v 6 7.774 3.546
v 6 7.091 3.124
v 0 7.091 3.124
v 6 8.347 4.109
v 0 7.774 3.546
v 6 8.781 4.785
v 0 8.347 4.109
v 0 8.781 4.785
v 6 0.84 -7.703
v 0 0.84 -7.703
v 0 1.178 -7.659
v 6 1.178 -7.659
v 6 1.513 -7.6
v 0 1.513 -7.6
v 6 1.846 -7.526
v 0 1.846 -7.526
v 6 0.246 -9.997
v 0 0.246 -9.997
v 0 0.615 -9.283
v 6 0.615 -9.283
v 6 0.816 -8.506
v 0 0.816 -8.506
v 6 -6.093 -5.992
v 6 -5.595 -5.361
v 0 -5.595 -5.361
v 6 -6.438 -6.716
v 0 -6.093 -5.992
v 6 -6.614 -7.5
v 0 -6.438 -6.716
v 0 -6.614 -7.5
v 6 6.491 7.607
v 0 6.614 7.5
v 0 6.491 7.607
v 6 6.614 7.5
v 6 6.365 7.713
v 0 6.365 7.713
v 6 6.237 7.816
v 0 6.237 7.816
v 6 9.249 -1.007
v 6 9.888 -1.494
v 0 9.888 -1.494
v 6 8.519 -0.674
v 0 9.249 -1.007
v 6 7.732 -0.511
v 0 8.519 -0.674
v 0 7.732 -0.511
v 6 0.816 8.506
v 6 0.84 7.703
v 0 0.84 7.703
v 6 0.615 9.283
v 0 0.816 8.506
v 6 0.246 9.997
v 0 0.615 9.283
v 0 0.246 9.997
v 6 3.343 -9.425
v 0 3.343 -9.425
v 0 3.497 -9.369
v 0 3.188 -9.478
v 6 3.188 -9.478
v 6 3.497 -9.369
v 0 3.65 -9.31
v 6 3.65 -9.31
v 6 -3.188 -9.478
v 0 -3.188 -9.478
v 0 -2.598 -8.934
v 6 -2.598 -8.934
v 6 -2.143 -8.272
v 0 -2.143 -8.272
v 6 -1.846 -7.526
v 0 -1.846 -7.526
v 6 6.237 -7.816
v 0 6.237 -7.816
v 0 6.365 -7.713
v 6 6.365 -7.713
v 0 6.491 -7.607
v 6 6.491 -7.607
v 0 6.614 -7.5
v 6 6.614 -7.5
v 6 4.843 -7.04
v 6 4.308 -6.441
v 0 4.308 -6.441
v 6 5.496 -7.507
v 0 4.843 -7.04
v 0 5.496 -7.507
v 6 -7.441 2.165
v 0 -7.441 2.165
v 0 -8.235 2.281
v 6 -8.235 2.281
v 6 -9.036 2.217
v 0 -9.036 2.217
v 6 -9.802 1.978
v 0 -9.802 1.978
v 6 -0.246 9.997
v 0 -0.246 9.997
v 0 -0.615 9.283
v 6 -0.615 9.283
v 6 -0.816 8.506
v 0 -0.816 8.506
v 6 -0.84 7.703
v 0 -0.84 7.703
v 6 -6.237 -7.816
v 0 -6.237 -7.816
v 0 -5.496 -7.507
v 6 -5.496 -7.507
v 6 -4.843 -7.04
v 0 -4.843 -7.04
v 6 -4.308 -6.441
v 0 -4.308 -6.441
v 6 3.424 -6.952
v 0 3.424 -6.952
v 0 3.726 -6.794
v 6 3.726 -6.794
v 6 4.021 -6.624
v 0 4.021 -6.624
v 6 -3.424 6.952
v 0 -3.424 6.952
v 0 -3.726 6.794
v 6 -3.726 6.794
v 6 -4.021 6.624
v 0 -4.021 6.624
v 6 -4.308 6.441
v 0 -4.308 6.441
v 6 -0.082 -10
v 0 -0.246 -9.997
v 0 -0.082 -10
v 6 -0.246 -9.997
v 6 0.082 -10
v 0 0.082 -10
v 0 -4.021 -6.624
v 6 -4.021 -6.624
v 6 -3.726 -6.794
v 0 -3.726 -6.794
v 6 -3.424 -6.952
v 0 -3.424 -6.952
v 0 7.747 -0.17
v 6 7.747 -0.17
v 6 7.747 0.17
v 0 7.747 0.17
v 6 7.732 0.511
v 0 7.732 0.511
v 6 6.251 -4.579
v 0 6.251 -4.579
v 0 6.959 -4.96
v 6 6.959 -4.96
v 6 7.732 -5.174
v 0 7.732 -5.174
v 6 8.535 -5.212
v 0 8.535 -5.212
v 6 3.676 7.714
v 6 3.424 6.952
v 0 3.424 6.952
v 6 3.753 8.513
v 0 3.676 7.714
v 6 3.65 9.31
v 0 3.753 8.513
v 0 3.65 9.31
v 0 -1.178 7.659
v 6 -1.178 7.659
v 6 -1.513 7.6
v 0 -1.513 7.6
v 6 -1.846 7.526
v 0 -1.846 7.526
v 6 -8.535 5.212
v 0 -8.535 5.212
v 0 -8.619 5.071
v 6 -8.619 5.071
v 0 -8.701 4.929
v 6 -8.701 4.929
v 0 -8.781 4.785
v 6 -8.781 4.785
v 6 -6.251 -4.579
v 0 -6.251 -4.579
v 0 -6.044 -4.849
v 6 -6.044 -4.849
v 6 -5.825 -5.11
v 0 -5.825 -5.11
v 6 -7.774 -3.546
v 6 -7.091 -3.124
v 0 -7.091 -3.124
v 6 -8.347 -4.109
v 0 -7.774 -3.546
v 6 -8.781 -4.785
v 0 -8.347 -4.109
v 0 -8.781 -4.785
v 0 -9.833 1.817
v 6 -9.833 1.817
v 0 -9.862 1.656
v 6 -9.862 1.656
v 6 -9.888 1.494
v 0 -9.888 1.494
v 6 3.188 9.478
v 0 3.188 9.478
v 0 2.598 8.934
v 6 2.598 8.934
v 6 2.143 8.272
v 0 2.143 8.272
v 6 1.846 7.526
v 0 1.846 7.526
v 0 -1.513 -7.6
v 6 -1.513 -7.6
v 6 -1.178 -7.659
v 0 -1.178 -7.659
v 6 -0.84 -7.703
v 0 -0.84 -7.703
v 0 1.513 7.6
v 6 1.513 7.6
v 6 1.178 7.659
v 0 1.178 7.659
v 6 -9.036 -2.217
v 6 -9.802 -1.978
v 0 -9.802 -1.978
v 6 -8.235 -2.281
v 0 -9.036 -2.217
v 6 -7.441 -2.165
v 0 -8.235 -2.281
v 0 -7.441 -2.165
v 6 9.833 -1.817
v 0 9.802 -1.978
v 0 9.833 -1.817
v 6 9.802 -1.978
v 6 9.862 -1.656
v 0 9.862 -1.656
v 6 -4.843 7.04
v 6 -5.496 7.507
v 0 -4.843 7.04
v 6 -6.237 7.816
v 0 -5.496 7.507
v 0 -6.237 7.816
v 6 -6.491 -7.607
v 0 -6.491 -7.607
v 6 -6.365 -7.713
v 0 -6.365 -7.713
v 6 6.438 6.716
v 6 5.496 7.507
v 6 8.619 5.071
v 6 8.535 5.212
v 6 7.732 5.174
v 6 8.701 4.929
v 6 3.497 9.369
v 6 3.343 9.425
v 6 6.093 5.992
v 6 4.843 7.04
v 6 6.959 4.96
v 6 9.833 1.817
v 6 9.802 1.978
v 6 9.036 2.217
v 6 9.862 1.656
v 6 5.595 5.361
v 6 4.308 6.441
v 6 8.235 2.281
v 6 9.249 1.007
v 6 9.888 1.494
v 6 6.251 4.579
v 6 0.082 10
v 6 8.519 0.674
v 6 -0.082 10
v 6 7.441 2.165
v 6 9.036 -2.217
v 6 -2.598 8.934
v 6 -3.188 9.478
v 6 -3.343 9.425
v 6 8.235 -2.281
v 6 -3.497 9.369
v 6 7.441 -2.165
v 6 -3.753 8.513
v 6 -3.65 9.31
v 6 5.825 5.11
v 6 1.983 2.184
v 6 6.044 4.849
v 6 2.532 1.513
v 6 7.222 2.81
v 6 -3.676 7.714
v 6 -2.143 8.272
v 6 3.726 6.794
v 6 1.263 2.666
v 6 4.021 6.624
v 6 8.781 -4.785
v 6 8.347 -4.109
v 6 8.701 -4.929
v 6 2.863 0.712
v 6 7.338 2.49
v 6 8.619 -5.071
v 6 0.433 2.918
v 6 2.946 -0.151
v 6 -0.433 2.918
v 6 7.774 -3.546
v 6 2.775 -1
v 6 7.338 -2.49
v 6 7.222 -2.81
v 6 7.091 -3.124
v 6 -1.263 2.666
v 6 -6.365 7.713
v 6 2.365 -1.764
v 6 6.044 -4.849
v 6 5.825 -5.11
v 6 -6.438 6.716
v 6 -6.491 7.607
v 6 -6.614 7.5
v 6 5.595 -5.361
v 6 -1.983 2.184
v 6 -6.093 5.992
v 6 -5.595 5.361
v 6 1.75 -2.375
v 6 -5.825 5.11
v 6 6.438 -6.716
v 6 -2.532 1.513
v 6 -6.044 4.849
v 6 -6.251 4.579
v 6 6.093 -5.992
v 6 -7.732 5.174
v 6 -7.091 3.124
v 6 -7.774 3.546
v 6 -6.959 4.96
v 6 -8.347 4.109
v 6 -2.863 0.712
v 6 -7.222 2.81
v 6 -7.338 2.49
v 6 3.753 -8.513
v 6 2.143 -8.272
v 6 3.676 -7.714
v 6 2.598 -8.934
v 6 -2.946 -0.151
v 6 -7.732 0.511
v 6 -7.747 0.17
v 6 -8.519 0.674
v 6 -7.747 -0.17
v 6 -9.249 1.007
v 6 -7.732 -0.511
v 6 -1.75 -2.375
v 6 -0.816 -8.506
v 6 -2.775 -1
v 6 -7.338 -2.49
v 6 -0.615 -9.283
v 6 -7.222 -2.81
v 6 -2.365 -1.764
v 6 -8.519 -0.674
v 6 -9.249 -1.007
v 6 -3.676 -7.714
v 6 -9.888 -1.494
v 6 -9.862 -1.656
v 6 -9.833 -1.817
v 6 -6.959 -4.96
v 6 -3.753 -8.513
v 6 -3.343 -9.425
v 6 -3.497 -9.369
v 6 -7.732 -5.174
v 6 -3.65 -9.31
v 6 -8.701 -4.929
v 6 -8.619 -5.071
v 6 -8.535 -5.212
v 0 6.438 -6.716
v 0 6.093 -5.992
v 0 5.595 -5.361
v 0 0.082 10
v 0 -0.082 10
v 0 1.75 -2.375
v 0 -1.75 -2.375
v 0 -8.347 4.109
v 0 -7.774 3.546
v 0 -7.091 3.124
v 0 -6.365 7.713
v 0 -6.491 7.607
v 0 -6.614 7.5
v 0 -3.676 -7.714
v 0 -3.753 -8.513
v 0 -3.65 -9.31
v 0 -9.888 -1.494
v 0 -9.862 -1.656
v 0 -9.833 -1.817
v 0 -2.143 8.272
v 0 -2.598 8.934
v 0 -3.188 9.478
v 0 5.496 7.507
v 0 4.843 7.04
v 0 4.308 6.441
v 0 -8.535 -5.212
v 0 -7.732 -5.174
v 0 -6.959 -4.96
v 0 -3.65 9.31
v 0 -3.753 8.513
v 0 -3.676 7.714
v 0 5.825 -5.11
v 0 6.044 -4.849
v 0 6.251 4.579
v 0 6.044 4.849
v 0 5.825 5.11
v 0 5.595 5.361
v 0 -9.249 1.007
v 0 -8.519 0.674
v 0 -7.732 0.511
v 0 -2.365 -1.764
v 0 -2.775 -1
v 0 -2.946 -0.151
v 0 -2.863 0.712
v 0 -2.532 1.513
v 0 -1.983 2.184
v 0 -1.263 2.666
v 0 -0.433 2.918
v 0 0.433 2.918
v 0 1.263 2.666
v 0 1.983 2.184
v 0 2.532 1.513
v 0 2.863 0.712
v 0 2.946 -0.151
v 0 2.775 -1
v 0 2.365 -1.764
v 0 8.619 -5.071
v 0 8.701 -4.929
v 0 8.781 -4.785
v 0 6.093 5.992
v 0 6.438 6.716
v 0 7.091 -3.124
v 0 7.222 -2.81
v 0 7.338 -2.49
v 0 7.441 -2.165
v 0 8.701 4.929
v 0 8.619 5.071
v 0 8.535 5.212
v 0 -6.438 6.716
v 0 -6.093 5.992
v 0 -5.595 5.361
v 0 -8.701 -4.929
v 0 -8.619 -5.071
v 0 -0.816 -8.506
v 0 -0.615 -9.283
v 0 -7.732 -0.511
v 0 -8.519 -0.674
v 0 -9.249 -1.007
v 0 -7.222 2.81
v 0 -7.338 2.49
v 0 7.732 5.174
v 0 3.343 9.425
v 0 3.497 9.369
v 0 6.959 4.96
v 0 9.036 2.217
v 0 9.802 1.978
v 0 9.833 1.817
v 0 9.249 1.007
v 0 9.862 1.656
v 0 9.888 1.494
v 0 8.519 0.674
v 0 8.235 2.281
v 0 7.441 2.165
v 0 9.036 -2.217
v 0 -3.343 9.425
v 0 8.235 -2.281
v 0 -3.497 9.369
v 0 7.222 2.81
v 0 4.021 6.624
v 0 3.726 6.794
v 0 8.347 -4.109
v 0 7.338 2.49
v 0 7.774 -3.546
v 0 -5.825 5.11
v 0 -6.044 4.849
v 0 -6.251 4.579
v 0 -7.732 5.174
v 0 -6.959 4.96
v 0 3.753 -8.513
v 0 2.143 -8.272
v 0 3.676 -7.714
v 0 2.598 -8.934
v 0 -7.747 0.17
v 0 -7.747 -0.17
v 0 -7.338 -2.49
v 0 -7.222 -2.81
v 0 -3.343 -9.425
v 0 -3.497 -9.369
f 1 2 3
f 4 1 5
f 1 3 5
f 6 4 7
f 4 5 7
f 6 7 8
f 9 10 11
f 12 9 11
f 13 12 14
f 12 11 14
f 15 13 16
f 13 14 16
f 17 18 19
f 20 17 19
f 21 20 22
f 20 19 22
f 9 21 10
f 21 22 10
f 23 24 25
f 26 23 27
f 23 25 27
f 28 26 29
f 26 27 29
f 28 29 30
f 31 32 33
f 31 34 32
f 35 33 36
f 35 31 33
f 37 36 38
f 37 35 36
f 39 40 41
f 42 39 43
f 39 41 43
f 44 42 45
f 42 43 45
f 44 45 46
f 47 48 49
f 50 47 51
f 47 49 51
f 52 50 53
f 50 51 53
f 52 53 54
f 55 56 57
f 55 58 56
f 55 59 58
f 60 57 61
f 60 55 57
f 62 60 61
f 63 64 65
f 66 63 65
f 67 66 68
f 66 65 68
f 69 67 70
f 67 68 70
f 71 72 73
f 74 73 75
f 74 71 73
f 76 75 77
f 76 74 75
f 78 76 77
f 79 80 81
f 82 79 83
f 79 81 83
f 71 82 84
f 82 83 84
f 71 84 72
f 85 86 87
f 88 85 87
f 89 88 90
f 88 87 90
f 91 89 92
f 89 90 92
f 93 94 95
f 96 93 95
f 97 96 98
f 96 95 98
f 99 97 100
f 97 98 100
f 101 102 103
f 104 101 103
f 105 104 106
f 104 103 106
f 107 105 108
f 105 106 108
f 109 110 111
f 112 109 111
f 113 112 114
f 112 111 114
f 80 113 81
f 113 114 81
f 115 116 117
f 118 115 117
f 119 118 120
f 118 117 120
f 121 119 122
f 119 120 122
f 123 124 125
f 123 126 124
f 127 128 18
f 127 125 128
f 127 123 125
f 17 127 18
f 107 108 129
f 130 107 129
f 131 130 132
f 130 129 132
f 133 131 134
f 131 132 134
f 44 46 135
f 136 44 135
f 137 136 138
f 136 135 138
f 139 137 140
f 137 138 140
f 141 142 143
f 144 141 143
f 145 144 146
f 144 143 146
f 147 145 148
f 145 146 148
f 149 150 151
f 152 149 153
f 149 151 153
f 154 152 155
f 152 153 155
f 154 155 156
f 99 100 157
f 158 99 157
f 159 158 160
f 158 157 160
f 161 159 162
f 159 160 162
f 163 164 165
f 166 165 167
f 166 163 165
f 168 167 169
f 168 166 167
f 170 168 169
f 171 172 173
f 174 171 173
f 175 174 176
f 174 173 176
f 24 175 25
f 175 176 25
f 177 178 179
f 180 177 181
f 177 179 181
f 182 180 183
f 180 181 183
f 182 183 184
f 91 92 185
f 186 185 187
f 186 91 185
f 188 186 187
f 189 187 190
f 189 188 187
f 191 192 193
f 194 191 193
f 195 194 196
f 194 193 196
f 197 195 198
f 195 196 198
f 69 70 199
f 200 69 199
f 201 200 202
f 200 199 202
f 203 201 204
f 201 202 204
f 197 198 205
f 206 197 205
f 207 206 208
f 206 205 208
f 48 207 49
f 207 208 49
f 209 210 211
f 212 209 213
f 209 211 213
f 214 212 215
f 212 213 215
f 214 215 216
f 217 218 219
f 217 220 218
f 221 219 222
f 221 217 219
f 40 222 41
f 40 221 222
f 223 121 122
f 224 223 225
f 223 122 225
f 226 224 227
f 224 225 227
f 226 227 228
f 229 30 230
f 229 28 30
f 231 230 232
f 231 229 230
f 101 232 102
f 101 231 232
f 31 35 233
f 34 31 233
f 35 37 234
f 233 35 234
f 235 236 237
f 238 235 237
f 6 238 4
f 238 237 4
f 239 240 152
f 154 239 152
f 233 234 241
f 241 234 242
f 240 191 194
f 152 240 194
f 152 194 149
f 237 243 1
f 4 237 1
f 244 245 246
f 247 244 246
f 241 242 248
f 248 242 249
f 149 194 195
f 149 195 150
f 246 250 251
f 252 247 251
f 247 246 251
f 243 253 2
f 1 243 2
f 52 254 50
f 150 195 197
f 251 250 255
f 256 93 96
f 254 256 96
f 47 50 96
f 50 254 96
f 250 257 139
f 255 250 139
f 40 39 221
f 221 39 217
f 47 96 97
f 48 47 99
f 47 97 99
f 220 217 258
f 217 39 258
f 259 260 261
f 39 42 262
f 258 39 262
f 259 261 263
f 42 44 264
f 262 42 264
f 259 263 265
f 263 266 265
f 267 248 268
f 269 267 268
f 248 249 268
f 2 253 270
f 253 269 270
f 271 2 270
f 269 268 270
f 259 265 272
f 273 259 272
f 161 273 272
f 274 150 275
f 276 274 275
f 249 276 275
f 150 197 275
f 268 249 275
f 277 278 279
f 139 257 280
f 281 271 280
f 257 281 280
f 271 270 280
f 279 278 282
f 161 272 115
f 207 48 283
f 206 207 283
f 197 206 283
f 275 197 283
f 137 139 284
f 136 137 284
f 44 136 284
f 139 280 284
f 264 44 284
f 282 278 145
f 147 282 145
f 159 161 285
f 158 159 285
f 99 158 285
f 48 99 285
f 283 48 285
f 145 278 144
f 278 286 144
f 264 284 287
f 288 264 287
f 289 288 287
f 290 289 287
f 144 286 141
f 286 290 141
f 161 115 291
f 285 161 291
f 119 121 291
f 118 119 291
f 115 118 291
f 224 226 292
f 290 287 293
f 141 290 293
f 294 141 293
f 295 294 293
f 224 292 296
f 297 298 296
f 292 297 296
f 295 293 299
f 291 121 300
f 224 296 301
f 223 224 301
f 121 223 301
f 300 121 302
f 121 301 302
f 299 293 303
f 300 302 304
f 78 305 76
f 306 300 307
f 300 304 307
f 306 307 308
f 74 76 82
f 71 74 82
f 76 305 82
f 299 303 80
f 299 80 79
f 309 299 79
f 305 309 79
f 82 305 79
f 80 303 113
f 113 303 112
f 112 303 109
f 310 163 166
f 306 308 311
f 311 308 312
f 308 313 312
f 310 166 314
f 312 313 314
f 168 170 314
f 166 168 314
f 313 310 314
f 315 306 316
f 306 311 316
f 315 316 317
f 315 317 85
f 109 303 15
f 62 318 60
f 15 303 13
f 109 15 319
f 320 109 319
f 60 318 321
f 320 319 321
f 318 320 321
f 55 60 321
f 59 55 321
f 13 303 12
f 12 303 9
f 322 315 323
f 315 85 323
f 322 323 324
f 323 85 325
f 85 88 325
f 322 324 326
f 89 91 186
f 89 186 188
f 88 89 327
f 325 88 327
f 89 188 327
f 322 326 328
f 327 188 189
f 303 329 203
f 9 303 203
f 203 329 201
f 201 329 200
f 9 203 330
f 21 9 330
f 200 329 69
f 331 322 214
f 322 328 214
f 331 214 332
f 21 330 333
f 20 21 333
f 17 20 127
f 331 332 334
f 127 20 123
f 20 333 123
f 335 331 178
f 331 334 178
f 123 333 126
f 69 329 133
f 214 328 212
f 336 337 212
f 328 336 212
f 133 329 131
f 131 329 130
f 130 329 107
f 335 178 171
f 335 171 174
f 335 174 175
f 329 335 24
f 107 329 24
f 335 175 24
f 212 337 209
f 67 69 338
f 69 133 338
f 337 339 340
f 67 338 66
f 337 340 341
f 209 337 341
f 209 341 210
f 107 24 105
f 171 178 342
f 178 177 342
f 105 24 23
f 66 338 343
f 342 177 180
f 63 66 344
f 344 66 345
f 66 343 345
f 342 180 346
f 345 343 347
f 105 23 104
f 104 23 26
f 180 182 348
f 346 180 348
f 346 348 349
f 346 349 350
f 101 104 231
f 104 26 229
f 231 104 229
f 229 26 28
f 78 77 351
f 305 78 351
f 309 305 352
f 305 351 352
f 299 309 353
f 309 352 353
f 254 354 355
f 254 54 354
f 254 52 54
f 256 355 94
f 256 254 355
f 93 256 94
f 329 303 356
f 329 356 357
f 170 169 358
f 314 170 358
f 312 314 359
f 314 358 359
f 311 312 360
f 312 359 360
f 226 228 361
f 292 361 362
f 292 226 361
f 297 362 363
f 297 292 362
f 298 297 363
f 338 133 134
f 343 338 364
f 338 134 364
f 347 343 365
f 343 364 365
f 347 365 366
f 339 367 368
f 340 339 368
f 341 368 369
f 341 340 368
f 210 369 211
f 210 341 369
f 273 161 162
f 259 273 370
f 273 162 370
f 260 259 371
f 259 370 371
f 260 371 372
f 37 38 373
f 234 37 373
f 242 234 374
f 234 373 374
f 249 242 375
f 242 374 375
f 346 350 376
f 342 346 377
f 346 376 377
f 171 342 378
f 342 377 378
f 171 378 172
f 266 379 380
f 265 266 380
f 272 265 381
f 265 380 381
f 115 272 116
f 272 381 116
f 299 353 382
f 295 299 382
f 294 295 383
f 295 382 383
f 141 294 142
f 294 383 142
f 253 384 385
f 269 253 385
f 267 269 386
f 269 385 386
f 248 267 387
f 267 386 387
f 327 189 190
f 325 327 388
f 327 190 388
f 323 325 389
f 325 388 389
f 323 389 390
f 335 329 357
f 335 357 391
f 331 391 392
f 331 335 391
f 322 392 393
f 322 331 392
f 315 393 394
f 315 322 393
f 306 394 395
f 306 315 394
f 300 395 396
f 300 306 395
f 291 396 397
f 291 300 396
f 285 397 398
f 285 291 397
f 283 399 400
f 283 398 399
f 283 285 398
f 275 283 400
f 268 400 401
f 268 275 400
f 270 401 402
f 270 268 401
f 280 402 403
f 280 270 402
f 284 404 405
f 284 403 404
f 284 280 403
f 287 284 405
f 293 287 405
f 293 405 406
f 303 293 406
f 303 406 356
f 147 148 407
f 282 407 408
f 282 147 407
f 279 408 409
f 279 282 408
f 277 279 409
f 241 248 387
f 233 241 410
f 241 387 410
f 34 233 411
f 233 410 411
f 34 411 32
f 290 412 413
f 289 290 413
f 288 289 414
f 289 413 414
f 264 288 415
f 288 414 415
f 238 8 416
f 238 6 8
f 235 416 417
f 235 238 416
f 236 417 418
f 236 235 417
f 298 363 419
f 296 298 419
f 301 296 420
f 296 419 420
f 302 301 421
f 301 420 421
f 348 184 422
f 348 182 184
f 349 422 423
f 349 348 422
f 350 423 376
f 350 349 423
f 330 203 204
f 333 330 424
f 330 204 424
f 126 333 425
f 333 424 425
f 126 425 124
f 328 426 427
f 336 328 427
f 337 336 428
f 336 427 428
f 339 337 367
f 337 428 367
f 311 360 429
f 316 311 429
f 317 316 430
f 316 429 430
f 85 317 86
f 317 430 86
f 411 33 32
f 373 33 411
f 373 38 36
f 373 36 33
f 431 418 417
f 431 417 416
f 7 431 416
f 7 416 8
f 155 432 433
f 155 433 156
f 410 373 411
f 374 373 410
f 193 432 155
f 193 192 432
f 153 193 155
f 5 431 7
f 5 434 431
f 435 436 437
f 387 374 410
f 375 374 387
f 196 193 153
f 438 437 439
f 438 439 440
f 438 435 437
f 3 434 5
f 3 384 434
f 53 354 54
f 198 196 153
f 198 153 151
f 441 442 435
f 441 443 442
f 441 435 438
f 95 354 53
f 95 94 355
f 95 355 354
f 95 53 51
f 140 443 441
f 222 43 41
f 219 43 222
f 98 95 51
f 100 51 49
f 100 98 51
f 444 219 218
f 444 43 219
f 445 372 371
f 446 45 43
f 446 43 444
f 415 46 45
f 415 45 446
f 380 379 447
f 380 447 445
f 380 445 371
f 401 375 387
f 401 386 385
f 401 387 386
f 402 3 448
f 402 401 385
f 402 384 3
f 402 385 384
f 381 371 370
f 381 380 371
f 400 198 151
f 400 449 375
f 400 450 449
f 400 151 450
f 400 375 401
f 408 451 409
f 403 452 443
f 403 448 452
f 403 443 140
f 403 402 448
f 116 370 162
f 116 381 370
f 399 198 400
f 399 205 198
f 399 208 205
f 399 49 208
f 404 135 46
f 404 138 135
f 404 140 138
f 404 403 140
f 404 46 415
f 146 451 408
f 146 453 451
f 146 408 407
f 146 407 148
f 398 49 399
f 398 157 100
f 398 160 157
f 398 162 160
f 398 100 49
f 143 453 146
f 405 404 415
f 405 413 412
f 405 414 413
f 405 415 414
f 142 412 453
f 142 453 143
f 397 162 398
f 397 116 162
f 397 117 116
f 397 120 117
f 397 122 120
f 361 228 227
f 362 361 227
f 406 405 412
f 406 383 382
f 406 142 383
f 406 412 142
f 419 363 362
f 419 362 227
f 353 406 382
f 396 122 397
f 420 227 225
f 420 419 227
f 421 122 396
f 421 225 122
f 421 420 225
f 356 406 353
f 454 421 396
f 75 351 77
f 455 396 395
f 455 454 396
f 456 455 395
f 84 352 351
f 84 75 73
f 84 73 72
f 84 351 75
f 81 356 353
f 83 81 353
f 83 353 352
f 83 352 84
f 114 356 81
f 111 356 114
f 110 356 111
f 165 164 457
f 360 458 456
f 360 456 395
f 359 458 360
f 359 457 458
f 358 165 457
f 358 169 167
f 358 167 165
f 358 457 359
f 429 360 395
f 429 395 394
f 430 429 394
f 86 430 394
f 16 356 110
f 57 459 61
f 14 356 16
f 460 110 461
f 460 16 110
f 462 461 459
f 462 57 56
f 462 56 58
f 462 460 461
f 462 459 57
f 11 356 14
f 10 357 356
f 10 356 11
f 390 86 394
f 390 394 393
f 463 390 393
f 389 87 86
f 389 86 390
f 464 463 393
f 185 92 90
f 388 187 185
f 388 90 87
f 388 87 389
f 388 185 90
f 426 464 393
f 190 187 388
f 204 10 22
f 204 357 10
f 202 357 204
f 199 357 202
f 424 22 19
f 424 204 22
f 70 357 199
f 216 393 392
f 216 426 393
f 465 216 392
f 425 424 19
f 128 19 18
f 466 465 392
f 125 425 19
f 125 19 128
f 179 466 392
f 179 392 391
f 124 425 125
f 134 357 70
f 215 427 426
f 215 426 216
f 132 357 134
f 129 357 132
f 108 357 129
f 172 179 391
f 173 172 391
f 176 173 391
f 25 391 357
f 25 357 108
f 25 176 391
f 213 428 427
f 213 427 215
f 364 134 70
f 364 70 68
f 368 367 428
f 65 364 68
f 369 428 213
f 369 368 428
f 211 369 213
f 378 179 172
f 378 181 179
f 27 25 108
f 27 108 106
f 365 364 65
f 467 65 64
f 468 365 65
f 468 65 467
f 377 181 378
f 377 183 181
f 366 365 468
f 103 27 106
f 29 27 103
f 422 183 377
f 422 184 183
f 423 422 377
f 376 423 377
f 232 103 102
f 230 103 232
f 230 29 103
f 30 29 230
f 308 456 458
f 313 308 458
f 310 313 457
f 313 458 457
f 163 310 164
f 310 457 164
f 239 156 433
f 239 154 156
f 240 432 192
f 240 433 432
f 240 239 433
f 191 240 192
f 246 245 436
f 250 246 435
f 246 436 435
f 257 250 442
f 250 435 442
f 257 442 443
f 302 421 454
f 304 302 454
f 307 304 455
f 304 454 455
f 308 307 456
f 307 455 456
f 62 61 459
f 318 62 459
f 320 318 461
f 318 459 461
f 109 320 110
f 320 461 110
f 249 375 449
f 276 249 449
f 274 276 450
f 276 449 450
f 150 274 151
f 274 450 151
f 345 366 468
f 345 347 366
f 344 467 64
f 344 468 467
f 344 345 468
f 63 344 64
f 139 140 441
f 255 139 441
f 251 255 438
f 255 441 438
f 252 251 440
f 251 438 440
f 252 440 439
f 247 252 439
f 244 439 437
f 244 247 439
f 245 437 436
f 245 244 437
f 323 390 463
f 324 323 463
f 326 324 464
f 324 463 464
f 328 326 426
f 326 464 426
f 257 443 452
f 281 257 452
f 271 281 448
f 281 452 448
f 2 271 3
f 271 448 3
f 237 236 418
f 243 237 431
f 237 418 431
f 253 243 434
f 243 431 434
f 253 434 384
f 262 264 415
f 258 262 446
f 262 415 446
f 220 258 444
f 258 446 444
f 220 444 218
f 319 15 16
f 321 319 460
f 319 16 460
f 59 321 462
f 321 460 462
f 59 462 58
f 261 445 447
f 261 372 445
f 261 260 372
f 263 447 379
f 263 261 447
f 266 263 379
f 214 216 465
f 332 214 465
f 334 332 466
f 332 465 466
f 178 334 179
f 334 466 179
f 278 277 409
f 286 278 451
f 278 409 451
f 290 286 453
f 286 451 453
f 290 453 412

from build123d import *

# Parameters (mm, degrees)
BASPROSKE_W        = 6
BASPROSKE_H        = 10
TOOTHCUT_DEPTH     = 16.362291496
TEETHCUTS_COUNT    = 18
TEETHCUTS_ANGLE    = 340
CUT_EXTRUDE1_DEPTH = 16.289512146


with BuildPart() as part:
    # BasProSke → Base-Revolve (revolve)
    with BuildSketch(Plane(origin=(0, 0, 0), x_dir=(1, 0, 0), z_dir=(0, 1, 0)), mode=Mode.PRIVATE) as base_revolve_sk:
        with Locations((3, 5)):
            Rectangle(BASPROSKE_W, BASPROSKE_H)
    revolve(base_revolve_sk.sketch.rotate(Axis((-10, 0, 0), (1, 0, 0)), 180), axis=Axis((-10, 0, 0), (1, 0, 0)))

    # TooCutSke → ToothCut (cut, through all)
    with BuildSketch(Plane(origin=(0, 0, 0), x_dir=(0, 0, -1), z_dir=(1, 0, 0))):
        with BuildLine():
            ThreePointArc((0.510641536, 7.732156635), (0, 7.749), (-0.510641536, 7.732156635))
            ThreePointArc((-0.510641536, 7.732156635), (-0.82619259, 8.907320741), (-1.515208602, 9.910236529))
            ThreePointArc((-1.515208602, 9.910236529), (0, 10.0254), (1.515208602, 9.910236529))
            ThreePointArc((1.515208602, 9.910236529), (0.82619259, 8.907320741), (0.510641536, 7.732156635))
        make_face()
    toothcut = extrude(amount=TOOTHCUT_DEPTH, mode=Mode.SUBTRACT)

    # TeethCuts: ToothCut ×18 about axis
    teethcuts_axis = Axis((-10, 0, 0), (1, 0, 0))
    for i in range(1, TEETHCUTS_COUNT):
        add(toothcut.rotate(teethcuts_axis, i * TEETHCUTS_ANGLE / (TEETHCUTS_COUNT - 1)), mode=Mode.SUBTRACT)

    # Sketch1 → Cut-Extrude1 (cut, through all)
    with BuildSketch(Plane(origin=(6, 0, 0), x_dir=(0, 0, -1), z_dir=(1, 0, 0))):
        with BuildLine():
            Line((2.374868417, 1.75), (2.374868417, -1.75))
            ThreePointArc((2.374868417, -1.75), (-2.95, 0), (2.374868417, 1.75))
        make_face()
    extrude(amount=-CUT_EXTRUDE1_DEPTH, mode=Mode.SUBTRACT)


solid = part.part
